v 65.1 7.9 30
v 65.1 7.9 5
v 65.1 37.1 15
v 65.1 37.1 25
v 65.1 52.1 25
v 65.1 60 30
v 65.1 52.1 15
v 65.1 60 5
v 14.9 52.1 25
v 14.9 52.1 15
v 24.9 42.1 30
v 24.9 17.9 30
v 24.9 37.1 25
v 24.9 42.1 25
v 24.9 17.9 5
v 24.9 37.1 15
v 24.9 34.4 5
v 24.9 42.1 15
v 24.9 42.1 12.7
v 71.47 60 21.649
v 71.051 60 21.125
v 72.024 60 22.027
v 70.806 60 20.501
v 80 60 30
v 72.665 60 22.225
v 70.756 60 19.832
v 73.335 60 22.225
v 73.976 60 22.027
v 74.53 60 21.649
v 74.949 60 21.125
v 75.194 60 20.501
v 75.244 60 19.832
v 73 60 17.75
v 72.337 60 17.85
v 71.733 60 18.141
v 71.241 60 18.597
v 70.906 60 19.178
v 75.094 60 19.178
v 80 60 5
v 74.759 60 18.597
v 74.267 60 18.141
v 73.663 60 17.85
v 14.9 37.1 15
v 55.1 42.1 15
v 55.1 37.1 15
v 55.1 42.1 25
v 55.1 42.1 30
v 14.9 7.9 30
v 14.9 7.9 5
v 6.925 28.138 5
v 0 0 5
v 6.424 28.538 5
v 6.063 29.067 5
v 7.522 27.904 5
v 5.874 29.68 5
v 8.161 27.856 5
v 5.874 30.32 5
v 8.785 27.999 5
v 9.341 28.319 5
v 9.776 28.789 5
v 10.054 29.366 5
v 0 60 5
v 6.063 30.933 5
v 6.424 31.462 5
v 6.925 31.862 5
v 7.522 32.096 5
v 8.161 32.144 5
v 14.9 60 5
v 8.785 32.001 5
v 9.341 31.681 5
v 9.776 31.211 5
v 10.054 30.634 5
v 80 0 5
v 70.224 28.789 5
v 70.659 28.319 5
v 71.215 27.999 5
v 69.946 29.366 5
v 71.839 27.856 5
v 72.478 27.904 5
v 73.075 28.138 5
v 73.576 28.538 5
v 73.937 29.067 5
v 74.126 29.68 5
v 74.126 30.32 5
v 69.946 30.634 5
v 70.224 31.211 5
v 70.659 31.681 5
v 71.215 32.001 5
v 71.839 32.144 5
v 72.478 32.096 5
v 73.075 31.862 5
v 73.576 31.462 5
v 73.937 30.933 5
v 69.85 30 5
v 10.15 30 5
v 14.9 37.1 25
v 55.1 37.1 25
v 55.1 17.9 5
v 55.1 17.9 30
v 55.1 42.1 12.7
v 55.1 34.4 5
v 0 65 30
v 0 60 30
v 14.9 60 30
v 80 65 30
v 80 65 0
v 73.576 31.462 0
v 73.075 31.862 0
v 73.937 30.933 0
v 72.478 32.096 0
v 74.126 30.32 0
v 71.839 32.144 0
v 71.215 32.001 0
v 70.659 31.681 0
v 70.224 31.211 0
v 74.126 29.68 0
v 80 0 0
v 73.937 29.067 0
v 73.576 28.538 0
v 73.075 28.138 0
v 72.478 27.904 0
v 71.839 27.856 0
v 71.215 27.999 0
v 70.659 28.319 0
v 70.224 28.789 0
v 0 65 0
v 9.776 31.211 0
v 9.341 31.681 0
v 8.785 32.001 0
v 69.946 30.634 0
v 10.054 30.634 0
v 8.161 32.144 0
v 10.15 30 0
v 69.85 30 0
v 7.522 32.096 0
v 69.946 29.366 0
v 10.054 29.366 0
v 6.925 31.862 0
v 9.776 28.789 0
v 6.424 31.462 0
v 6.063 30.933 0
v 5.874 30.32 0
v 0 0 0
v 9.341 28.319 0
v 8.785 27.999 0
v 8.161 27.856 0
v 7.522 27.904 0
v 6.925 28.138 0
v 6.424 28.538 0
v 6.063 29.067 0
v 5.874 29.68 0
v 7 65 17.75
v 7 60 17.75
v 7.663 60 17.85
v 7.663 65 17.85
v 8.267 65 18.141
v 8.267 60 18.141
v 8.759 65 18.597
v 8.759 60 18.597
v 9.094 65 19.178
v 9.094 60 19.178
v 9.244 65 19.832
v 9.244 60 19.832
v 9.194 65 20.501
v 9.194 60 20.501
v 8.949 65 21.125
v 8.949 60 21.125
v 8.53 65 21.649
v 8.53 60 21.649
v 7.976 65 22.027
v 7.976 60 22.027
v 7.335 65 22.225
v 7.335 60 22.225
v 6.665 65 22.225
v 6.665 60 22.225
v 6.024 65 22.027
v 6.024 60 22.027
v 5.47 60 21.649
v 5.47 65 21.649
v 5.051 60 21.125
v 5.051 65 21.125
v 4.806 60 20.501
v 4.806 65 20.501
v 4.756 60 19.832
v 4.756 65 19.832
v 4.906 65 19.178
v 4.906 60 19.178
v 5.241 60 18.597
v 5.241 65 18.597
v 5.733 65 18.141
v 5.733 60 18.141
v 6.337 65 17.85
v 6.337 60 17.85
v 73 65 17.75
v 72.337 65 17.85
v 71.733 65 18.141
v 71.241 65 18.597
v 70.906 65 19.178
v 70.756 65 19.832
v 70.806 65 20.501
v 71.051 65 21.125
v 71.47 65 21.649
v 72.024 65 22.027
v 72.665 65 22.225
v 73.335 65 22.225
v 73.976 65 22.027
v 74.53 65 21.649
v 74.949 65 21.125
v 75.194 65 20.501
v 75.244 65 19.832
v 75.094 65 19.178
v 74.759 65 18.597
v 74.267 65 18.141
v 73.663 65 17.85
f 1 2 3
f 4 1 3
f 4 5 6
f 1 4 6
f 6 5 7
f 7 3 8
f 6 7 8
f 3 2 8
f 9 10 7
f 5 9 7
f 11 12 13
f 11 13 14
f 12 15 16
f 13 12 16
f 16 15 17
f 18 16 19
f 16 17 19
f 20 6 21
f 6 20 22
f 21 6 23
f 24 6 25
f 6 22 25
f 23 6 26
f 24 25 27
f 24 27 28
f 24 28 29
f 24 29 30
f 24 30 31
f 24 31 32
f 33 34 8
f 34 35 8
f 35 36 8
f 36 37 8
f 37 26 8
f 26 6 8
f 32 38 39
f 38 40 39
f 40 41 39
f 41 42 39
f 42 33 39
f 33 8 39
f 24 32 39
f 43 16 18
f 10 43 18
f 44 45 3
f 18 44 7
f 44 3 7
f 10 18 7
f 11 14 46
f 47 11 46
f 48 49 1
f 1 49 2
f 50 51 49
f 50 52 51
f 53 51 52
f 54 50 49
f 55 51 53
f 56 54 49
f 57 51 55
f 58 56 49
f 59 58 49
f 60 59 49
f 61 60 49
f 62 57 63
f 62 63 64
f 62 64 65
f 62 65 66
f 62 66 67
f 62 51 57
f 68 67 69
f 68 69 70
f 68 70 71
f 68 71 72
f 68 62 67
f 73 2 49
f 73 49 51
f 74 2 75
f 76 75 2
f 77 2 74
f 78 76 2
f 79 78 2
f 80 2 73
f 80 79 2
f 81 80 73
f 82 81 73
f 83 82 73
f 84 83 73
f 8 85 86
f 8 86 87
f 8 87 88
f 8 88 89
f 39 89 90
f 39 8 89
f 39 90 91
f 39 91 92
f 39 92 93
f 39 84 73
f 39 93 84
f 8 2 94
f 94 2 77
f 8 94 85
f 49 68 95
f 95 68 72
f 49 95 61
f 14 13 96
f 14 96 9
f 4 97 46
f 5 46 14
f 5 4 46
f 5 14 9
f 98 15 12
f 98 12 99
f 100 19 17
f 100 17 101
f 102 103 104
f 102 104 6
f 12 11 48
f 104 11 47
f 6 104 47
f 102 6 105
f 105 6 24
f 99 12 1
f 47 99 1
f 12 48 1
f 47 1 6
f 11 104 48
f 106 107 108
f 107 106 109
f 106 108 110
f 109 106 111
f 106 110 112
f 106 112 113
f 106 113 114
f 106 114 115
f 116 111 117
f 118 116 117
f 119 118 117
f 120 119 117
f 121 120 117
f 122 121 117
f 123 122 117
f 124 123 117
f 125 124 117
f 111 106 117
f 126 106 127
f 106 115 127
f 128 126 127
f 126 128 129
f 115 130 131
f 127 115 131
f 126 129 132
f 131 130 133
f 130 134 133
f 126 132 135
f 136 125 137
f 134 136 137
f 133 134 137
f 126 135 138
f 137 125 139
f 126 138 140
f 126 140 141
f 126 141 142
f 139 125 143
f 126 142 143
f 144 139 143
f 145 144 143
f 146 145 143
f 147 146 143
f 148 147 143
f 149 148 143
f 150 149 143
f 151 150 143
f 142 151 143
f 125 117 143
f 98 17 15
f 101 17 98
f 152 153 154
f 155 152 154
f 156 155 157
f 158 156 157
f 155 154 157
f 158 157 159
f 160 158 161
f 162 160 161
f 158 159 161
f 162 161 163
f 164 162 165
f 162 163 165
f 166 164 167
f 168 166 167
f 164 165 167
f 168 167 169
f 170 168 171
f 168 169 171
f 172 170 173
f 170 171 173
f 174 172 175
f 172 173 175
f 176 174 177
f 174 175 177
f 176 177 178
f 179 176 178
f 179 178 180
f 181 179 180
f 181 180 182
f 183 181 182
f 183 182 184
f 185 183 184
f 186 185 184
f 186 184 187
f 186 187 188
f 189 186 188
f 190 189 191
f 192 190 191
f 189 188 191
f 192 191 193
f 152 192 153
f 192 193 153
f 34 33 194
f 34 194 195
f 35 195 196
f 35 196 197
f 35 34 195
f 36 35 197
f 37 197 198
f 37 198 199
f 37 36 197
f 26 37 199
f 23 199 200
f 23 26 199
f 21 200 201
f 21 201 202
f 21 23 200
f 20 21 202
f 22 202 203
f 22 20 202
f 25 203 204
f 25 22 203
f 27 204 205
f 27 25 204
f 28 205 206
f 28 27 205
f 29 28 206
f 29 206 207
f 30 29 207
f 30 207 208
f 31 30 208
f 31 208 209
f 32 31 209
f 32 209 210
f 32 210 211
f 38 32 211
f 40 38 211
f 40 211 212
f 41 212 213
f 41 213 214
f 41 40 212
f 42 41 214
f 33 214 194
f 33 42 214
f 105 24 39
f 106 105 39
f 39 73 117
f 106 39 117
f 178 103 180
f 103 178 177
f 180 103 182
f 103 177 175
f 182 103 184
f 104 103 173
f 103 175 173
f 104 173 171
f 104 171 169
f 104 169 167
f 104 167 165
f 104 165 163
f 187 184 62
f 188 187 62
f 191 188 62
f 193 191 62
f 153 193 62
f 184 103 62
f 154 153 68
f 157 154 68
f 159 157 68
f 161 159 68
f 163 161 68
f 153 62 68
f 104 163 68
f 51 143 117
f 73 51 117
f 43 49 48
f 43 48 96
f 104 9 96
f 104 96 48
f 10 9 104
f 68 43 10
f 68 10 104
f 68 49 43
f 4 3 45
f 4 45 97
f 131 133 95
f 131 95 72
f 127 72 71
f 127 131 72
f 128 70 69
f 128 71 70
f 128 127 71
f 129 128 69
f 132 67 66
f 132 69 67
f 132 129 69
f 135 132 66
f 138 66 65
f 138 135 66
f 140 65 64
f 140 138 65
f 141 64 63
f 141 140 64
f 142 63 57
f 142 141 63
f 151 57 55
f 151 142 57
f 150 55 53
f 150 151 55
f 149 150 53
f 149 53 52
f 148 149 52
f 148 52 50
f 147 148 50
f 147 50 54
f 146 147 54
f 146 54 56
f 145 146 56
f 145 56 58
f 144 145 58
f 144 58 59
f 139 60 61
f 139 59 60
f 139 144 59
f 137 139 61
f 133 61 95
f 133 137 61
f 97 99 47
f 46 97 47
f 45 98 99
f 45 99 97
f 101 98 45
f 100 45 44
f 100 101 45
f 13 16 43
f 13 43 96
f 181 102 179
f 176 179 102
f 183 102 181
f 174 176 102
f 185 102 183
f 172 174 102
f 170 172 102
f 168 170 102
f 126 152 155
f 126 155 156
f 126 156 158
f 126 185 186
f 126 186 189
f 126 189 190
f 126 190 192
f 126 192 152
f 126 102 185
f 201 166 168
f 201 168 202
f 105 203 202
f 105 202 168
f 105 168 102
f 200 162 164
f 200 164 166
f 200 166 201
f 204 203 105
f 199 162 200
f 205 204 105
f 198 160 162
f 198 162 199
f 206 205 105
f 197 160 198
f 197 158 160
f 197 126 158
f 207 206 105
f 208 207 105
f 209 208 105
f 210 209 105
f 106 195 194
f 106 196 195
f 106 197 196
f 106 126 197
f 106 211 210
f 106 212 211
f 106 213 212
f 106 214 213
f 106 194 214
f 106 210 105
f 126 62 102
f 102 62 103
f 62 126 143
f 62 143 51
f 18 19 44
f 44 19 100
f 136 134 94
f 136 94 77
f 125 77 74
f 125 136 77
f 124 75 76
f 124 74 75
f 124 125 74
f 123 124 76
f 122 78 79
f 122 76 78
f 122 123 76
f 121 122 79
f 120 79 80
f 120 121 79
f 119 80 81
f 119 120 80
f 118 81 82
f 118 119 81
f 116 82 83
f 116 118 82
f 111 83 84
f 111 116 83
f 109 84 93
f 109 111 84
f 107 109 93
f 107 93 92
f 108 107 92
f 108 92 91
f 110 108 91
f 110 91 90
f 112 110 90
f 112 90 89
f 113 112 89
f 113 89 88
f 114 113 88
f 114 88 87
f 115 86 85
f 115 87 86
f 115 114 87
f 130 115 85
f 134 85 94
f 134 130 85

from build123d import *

# Parameters (mm, degrees)
SKETCH1_W               = 80
SKETCH1_H               = 60
BOSS_EXTRUDE1_DEPTH     = 5
SKETCH2_W               = 50.2
SKETCH2_H               = 44.2
SKETCH2_W_2             = 30.2
SKETCH2_H_2             = 24.2
BOSS_EXTRUDE2_DEPTH     = 25
CUT_EXTRUDE1_DEPTH      = 87.810195254
CUT_EXTRUDE1_DEPTH_BACK = 87.810195254
SKETCH3_W               = 10
SKETCH3_H               = 15
SKETCH4_W               = 50.2
SKETCH4_H               = 7.9
BOSS_EXTRUDE3_DEPTH     = 25
CHAMFER1_SIZE           = 7.7
SKETCH5_W               = 14.9
SKETCH5_H               = 25
BOSS_EXTRUDE4_DEPTH     = 5
SKETCH6_R               = 2.25
CUT_EXTRUDE3_DEPTH      = 5
CUT_EXTRUDE4_DEPTH      = 107.066017178
CUT_EXTRUDE4_DEPTH_BACK = 107.066017178
SKETCH7_R               = 2.15


with BuildPart() as part:
    # Sketch1 → Boss-Extrude1 (new body)
    with BuildSketch(Plane.XY):
        with Locations((40, 30)):
            Rectangle(SKETCH1_W, SKETCH1_H)
    extrude(amount=BOSS_EXTRUDE1_DEPTH)

    # Sketch2 → Boss-Extrude2 (add)
    with BuildSketch(Plane.XY.offset(5)):
        with Locations((40, 30)):
            Rectangle(SKETCH2_W, SKETCH2_H)
        with Locations((40, 30)):
            Rectangle(SKETCH2_W_2, SKETCH2_H_2, mode=Mode.SUBTRACT)
    extrude(amount=BOSS_EXTRUDE2_DEPTH)

    # Sketch3 → Cut-Extrude1 (cut, two sides: drawn at the far end of the back side and taken through both)
    with BuildSketch(Plane.ZY.offset(-55.1).offset(-CUT_EXTRUDE1_DEPTH_BACK)):
        with Locations((20, 44.6)):
            Rectangle(SKETCH3_W, SKETCH3_H)
    extrude(amount=CUT_EXTRUDE1_DEPTH + CUT_EXTRUDE1_DEPTH_BACK, mode=Mode.SUBTRACT)

    # Sketch4 → Boss-Extrude3 (add)
    with BuildSketch(Plane.XY.offset(5)):
        with Locations((40, 56.05)):
            Rectangle(SKETCH4_W, SKETCH4_H)
    extrude(amount=BOSS_EXTRUDE3_DEPTH)

    # Chamfer1
    chamfer1_edges = [part.edges().sort_by_distance(p)[0] for p in [
        (40, 42.1, 5),
    ]]
    chamfer(chamfer1_edges, length=CHAMFER1_SIZE)

    # Sketch5 → Boss-Extrude4 (add)
    with BuildSketch(Plane(origin=(0, 60, 0), x_dir=(1, 0, 0), z_dir=(0, 1, 0))):
        with Locations((7.45, -17.5)):
            Rectangle(SKETCH5_W, SKETCH5_H)
        Polygon((80, -5), (80, 0), (0, 0), (0, -5), (14.9, -5), (14.9, -30), (65.1, -30), (65.1, -5), align=None)
        with Locations((72.55, -17.5)):
            Rectangle(SKETCH5_W, SKETCH5_H)
    extrude(amount=BOSS_EXTRUDE4_DEPTH)

    # Sketch6 → Cut-Extrude3 (cut)
    with BuildSketch(Plane.XZ.offset(-60)):
        with Locations(Location((7, 20, 0), (0, 0, 270))):
            Circle(SKETCH6_R)
    cut_extrude3 = extrude(amount=-CUT_EXTRUDE3_DEPTH, mode=Mode.SUBTRACT)

    # Mirror1: Cut-Extrude3 across plane
    add(cut_extrude3.mirror(Plane.ZY.offset(-40)), mode=Mode.SUBTRACT)

    # Sketch7 → Cut-Extrude4 (cut, two sides: drawn at the far end of the back side and taken through both)
    with BuildSketch(Plane.XY.offset(5).offset(-CUT_EXTRUDE4_DEPTH_BACK)):
        with Locations((8, 30)):
            Circle(SKETCH7_R)
        with Locations(Location((72, 30, 0), (0, 0, 180))):
            Circle(SKETCH7_R)
    extrude(amount=CUT_EXTRUDE4_DEPTH + CUT_EXTRUDE4_DEPTH_BACK, mode=Mode.SUBTRACT)


solid = part.part
